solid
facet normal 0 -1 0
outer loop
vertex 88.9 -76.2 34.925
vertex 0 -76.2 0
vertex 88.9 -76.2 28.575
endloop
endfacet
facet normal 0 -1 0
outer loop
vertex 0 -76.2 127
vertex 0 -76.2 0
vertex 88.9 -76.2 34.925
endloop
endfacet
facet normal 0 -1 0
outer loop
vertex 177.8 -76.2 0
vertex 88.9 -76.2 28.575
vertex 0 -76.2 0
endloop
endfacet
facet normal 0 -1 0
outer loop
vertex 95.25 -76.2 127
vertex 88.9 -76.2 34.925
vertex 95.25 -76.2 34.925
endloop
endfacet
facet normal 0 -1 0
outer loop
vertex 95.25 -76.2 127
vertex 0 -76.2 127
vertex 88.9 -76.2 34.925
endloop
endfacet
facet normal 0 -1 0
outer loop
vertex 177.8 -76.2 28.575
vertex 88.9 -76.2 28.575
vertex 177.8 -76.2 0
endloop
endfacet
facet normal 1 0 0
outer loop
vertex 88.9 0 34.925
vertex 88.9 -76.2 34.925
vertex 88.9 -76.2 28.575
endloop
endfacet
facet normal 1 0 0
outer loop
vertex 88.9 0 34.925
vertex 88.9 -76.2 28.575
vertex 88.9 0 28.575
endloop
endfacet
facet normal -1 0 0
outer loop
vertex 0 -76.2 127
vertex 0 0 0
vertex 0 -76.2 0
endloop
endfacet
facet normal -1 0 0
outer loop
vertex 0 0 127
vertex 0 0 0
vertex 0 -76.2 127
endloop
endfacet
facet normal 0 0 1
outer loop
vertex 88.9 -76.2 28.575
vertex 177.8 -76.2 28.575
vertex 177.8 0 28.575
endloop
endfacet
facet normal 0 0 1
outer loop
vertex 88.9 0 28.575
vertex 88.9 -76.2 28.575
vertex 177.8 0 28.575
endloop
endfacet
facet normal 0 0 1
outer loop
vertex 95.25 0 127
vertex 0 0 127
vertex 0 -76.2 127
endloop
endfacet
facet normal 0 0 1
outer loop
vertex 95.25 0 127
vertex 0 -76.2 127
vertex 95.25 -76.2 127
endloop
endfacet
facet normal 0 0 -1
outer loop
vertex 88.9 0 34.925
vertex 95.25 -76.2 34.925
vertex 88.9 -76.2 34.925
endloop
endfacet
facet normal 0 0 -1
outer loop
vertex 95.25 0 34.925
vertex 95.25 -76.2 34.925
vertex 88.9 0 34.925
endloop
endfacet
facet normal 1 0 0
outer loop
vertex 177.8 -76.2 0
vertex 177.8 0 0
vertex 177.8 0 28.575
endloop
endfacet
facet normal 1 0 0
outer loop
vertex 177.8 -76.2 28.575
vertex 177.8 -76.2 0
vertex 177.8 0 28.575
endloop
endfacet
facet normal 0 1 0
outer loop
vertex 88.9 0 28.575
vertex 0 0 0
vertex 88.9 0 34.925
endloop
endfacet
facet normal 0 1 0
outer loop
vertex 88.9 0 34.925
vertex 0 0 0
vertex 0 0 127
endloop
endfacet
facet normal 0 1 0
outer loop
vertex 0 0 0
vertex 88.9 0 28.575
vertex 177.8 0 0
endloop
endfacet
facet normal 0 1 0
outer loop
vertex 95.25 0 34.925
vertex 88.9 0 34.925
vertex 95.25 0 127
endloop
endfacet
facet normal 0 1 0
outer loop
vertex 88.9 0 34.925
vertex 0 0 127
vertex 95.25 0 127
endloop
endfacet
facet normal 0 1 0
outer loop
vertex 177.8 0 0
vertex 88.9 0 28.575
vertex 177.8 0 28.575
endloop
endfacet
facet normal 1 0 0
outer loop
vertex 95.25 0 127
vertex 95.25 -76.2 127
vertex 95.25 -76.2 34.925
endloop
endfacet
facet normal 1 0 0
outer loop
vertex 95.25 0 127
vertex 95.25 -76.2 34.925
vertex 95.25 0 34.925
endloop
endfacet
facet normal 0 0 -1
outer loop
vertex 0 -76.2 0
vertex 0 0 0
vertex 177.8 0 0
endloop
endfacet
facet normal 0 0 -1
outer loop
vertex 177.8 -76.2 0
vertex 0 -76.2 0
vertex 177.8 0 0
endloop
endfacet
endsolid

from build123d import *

# Parameters (mm, degrees)
F0_W     = 177.8
F0_H     = 127
F1_DEPTH = 76.2
F2_W     = 76.2
F2_H     = 92.075
F3_DEPTH = 82.55
F4_W     = 76.2
F4_H     = 6.35
F5_DEPTH = 88.9


with BuildPart() as f1:
    # F0 (on Front) → F1 (new body)
    with BuildSketch(Plane.XZ):
        with Locations((88.9, 63.5)):
            Rectangle(F0_W, F0_H)
    extrude(amount=F1_DEPTH)

    # F2 (on face) → F3 (cut)
    with BuildSketch(Plane.YZ.offset(177.8)):
        with Locations((-38.1, 80.9625)):
            Rectangle(F2_W, F2_H)
    extrude(amount=-F3_DEPTH, mode=Mode.SUBTRACT)

    # F4 (on face) → F5 (cut)
    with BuildSketch(Plane.YZ.offset(177.8)):
        with Locations((-38.1, 31.75)):
            Rectangle(F4_W, F4_H)
    extrude(amount=-F5_DEPTH, mode=Mode.SUBTRACT)


solid = f1.part
